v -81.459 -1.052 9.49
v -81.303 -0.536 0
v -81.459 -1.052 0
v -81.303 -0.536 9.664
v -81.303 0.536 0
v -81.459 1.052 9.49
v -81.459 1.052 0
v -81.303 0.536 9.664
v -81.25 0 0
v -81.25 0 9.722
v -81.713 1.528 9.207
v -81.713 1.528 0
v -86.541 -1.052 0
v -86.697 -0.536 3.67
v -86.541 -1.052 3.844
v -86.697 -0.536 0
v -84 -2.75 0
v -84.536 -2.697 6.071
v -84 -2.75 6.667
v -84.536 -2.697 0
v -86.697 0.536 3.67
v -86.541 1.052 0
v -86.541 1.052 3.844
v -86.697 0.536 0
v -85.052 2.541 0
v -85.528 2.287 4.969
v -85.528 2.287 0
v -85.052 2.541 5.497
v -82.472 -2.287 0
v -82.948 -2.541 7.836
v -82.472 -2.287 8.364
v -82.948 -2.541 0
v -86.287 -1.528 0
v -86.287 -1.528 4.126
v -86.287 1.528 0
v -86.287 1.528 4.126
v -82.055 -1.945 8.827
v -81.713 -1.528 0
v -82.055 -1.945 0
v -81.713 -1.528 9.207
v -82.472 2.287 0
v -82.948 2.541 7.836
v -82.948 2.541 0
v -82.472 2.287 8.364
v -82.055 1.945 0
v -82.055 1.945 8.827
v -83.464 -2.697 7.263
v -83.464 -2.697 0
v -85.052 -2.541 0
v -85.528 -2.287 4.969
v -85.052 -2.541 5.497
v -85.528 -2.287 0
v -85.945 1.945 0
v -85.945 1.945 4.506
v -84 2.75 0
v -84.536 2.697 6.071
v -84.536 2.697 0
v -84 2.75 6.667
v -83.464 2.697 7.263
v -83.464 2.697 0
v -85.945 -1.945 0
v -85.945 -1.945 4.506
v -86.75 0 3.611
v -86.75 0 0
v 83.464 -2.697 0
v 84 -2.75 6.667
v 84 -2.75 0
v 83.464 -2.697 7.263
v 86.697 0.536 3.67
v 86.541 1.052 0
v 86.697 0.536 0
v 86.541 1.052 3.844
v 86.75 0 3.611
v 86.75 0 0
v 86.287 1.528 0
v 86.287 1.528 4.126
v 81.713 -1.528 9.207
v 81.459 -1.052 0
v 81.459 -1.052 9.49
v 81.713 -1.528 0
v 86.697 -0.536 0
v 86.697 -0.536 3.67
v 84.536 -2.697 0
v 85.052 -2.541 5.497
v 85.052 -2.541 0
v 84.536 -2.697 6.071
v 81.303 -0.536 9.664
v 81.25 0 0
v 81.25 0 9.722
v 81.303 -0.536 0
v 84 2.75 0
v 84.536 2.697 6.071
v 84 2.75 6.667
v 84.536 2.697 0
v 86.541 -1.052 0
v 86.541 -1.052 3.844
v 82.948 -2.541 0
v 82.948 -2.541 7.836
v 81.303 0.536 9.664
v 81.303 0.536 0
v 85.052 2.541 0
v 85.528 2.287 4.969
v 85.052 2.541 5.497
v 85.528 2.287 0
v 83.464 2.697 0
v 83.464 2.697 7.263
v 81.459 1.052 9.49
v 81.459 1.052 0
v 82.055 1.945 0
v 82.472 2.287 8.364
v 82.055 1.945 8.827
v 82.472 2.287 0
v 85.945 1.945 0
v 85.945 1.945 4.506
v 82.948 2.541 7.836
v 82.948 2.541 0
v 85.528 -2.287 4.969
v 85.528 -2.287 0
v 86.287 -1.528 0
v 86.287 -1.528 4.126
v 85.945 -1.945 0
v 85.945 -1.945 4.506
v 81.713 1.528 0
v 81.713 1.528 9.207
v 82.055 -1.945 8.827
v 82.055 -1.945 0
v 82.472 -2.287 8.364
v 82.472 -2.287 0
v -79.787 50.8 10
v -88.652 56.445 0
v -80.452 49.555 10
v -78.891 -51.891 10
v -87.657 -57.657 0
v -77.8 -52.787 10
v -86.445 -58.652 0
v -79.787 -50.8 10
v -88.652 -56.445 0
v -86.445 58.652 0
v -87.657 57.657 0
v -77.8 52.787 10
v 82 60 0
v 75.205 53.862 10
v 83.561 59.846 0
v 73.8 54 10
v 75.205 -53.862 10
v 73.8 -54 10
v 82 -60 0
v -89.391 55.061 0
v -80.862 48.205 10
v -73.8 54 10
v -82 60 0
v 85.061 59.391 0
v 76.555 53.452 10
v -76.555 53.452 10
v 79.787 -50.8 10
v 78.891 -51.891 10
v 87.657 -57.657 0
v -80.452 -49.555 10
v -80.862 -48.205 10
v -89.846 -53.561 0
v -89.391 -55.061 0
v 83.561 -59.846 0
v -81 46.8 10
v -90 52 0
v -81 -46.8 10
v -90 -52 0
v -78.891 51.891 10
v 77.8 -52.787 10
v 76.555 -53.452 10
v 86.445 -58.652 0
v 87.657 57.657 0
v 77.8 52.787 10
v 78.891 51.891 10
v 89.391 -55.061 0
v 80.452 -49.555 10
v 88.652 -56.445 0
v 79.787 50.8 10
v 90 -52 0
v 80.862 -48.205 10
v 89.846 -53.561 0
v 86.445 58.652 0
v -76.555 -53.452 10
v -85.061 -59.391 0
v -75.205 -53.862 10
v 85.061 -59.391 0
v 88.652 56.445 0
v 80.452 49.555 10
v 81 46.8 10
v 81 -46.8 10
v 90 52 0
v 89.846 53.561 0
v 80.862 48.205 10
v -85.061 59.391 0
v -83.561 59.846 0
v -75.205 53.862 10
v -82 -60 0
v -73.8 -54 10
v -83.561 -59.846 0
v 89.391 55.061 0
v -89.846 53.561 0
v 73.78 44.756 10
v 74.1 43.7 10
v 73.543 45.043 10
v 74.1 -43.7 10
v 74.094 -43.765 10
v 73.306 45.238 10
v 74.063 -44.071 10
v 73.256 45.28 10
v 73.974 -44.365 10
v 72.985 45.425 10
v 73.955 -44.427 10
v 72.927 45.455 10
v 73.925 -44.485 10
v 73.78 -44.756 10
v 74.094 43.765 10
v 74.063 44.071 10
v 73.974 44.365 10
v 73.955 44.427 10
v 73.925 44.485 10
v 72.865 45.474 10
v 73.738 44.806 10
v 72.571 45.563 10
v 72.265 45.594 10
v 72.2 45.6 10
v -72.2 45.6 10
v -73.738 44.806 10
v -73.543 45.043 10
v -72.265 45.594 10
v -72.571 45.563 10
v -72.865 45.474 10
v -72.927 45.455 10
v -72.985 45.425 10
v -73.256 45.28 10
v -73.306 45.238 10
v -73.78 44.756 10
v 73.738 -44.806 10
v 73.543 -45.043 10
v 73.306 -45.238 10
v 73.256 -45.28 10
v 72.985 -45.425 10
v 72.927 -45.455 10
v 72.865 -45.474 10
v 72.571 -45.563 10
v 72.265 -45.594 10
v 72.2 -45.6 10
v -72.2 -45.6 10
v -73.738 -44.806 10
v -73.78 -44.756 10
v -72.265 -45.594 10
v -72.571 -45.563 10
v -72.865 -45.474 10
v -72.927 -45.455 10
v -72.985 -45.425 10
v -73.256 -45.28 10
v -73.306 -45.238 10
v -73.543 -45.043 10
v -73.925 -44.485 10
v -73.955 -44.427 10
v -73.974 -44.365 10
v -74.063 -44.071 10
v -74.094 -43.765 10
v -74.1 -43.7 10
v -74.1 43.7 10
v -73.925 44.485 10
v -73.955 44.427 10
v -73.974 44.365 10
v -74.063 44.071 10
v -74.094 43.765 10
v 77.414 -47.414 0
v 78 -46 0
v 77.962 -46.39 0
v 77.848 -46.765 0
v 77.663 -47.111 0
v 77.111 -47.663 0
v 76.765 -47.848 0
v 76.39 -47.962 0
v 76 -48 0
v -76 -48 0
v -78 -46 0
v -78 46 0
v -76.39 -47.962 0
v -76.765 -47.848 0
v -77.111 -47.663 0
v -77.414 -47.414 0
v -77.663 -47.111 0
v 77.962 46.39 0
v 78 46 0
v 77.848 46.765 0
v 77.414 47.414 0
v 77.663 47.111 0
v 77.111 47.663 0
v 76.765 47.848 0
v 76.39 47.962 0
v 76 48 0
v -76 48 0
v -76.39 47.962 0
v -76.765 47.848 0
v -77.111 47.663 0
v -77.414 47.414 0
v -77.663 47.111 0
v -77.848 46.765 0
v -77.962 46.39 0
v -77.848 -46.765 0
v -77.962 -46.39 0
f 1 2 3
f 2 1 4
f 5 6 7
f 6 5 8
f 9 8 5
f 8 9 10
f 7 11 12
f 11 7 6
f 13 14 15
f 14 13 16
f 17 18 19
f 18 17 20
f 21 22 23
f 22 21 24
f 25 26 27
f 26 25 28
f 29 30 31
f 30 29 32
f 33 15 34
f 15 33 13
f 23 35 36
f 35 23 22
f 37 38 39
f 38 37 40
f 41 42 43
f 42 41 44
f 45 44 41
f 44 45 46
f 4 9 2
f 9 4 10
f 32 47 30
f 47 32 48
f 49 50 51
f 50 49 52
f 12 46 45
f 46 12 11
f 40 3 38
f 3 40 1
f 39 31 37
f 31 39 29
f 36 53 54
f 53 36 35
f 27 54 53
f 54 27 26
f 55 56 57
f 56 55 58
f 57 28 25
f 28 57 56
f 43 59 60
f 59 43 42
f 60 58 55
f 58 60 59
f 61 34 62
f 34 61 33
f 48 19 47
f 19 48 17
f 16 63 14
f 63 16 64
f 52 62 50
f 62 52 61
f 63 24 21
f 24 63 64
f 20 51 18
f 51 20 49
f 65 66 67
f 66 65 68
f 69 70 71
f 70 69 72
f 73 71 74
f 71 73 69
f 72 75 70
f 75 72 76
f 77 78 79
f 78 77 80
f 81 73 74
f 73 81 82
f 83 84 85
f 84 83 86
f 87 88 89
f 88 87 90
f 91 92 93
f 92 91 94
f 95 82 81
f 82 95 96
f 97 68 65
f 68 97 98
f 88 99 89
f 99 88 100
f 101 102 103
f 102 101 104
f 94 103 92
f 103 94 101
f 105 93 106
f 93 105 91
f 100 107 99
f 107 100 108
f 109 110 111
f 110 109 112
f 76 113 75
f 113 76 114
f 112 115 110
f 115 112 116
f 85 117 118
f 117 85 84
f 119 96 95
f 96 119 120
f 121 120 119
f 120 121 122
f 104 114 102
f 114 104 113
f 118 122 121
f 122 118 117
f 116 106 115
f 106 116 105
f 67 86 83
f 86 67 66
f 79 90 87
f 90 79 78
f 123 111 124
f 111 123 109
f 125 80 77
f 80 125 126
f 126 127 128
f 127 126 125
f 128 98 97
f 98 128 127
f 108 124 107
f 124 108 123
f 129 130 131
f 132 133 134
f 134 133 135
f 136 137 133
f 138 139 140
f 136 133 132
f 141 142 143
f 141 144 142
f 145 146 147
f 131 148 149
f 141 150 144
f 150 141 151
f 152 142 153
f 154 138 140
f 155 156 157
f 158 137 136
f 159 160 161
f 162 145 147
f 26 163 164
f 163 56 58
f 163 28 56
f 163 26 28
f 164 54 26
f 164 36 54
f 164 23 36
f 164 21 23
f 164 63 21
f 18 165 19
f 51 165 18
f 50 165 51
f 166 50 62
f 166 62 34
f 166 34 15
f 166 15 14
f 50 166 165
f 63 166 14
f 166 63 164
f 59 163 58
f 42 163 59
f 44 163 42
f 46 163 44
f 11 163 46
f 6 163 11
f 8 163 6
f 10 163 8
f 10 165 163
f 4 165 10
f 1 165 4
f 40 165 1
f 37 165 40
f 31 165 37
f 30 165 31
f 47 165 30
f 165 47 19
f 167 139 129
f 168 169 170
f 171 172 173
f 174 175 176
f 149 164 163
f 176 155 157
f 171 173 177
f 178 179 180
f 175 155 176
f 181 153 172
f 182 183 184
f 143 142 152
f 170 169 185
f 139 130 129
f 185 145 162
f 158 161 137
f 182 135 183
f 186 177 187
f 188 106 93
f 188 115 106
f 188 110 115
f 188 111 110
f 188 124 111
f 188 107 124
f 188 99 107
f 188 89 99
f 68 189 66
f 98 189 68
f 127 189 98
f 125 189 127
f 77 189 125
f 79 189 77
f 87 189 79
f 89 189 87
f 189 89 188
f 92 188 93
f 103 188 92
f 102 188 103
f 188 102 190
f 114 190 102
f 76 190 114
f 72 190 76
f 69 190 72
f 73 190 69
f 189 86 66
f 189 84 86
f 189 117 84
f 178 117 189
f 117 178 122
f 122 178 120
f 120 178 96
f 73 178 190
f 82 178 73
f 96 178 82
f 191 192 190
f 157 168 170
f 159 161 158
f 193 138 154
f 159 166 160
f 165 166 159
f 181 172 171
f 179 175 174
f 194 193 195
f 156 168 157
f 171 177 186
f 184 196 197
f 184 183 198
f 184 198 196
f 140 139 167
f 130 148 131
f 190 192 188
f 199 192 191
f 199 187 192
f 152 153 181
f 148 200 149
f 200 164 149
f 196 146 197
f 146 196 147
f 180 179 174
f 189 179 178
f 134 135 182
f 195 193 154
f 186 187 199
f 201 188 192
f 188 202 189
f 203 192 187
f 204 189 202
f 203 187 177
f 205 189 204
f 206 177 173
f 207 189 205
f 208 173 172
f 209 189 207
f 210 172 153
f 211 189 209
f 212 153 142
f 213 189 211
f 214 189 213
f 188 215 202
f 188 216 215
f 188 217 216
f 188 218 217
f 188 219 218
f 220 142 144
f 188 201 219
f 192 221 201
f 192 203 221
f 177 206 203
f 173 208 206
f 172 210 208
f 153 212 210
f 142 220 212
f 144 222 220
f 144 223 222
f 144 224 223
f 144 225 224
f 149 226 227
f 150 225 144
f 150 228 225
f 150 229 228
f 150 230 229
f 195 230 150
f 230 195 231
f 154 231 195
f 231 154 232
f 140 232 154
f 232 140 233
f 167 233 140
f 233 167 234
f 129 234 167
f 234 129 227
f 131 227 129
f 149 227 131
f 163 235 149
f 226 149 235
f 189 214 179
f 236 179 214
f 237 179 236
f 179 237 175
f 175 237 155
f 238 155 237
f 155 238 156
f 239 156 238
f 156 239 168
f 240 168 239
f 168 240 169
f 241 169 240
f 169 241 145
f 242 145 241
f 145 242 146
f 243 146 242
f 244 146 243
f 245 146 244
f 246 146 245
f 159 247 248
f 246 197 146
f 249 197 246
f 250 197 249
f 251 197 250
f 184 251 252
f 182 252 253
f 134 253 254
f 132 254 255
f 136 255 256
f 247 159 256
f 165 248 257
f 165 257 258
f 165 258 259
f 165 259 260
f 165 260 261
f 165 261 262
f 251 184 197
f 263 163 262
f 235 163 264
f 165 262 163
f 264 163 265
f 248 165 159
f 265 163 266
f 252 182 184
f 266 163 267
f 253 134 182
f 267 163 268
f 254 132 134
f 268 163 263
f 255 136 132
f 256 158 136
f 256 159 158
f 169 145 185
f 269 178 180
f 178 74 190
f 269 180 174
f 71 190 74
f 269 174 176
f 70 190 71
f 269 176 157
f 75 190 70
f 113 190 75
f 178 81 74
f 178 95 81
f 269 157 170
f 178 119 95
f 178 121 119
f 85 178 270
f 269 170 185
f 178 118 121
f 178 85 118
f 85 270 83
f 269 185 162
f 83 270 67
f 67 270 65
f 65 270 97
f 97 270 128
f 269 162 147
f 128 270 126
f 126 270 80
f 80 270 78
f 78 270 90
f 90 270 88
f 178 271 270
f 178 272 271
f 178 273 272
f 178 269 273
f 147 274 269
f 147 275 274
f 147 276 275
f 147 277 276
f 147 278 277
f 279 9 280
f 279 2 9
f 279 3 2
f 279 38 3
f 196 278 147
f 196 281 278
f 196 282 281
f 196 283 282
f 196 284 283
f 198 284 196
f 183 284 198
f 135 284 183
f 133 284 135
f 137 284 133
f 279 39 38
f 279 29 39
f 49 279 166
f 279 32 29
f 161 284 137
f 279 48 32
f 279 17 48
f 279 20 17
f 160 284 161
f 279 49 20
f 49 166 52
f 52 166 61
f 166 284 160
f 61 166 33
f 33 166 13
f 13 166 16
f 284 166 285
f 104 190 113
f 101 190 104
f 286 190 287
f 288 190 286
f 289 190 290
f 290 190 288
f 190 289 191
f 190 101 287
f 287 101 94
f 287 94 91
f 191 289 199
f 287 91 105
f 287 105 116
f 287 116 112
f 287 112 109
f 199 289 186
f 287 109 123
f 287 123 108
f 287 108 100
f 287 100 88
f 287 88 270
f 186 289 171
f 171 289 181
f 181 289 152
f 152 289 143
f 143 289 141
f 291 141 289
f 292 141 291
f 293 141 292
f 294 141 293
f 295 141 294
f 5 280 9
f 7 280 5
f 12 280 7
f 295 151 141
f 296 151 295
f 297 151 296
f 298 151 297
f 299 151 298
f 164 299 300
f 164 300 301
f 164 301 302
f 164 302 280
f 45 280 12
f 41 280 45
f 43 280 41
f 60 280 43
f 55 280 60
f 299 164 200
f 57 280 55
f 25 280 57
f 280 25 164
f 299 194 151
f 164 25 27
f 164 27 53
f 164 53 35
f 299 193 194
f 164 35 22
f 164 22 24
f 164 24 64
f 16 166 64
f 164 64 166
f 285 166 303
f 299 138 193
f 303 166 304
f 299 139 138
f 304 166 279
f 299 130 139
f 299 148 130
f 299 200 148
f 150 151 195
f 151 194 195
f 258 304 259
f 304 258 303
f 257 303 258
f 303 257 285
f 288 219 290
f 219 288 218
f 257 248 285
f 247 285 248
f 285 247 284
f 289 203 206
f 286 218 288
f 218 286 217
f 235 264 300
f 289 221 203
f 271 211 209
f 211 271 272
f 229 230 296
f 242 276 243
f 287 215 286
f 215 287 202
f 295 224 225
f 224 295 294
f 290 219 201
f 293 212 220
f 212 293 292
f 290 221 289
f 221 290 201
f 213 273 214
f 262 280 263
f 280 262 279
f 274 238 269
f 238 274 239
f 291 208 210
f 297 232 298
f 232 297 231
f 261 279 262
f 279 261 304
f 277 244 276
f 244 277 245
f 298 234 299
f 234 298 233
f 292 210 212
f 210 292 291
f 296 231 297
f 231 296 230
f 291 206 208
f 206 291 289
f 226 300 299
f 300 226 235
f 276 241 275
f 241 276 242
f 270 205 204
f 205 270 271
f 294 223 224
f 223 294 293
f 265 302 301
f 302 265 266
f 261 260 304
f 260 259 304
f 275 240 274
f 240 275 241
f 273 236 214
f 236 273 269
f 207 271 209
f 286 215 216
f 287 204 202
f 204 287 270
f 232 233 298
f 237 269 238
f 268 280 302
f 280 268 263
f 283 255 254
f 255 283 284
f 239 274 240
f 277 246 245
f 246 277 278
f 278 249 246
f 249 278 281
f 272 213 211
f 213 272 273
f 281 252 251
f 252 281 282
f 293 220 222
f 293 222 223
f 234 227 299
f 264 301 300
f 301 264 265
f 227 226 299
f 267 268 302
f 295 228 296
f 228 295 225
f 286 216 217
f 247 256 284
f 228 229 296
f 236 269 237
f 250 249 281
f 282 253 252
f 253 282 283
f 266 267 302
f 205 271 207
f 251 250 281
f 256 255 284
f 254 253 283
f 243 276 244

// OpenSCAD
$fn = 32;

// ----------------------------------------------------------------------
// Display bezel: 180 x 120 mm frame, opening 156x96 mm
// ----------------------------------------------------------------------

// --- parameters (mm) ---
length = 180;             // frame outside length, X
width = 120;              // frame outside width, Y
frame_w = 12;             // frame width
thickness = 10;           // frame thickness
corner_r = 8;             // outside corner radius
chamfer = 0.9;            // outer wall taper
funnel = 0.94;            // inner opening taper
opening_l = 156;          // opening length
opening_w = 96;           // opening width
inner_r = 2;              // opening corner radius
hole_d = 5.5;             // mounting screw clearance
holes_per_side = 1;       // holes per short side
hole_inset = 6;           // hole centre inset from the outside edge

/* rounded-rectangle outlines, generated with loops */
module rounded_ring(l_nom, w_nom, r) {
  hull() {
    for (sx = [-1, 1]) for (sy = [-1, 1])
      translate([sx * (l_nom / 2 - r), sy * (w_nom / 2 - r)]) circle(r = r);
  }
}

difference() {
  /* frame body, drafted so the outer edge is a variable-depth chamfer */
  linear_extrude(height = thickness, scale = chamfer)
    rounded_ring(length, width, corner_r);
  /* viewing opening, drafted the other way for a funnel edge */
  linear_extrude(height = thickness + 2, scale = funnel)
    translate([0, 0, -1]) rounded_ring(opening_l, opening_w, inner_r);
  /* mounting screws through the frame lands */
  for (sx = [-1, 1]) for (i = [1 : holes_per_side])
    translate([sx * (length / 2 - hole_inset),
               (i - (holes_per_side + 1) / 2) * width * 0.5, -1])
      cylinder(h = thickness + 2, d = hole_d);
}
